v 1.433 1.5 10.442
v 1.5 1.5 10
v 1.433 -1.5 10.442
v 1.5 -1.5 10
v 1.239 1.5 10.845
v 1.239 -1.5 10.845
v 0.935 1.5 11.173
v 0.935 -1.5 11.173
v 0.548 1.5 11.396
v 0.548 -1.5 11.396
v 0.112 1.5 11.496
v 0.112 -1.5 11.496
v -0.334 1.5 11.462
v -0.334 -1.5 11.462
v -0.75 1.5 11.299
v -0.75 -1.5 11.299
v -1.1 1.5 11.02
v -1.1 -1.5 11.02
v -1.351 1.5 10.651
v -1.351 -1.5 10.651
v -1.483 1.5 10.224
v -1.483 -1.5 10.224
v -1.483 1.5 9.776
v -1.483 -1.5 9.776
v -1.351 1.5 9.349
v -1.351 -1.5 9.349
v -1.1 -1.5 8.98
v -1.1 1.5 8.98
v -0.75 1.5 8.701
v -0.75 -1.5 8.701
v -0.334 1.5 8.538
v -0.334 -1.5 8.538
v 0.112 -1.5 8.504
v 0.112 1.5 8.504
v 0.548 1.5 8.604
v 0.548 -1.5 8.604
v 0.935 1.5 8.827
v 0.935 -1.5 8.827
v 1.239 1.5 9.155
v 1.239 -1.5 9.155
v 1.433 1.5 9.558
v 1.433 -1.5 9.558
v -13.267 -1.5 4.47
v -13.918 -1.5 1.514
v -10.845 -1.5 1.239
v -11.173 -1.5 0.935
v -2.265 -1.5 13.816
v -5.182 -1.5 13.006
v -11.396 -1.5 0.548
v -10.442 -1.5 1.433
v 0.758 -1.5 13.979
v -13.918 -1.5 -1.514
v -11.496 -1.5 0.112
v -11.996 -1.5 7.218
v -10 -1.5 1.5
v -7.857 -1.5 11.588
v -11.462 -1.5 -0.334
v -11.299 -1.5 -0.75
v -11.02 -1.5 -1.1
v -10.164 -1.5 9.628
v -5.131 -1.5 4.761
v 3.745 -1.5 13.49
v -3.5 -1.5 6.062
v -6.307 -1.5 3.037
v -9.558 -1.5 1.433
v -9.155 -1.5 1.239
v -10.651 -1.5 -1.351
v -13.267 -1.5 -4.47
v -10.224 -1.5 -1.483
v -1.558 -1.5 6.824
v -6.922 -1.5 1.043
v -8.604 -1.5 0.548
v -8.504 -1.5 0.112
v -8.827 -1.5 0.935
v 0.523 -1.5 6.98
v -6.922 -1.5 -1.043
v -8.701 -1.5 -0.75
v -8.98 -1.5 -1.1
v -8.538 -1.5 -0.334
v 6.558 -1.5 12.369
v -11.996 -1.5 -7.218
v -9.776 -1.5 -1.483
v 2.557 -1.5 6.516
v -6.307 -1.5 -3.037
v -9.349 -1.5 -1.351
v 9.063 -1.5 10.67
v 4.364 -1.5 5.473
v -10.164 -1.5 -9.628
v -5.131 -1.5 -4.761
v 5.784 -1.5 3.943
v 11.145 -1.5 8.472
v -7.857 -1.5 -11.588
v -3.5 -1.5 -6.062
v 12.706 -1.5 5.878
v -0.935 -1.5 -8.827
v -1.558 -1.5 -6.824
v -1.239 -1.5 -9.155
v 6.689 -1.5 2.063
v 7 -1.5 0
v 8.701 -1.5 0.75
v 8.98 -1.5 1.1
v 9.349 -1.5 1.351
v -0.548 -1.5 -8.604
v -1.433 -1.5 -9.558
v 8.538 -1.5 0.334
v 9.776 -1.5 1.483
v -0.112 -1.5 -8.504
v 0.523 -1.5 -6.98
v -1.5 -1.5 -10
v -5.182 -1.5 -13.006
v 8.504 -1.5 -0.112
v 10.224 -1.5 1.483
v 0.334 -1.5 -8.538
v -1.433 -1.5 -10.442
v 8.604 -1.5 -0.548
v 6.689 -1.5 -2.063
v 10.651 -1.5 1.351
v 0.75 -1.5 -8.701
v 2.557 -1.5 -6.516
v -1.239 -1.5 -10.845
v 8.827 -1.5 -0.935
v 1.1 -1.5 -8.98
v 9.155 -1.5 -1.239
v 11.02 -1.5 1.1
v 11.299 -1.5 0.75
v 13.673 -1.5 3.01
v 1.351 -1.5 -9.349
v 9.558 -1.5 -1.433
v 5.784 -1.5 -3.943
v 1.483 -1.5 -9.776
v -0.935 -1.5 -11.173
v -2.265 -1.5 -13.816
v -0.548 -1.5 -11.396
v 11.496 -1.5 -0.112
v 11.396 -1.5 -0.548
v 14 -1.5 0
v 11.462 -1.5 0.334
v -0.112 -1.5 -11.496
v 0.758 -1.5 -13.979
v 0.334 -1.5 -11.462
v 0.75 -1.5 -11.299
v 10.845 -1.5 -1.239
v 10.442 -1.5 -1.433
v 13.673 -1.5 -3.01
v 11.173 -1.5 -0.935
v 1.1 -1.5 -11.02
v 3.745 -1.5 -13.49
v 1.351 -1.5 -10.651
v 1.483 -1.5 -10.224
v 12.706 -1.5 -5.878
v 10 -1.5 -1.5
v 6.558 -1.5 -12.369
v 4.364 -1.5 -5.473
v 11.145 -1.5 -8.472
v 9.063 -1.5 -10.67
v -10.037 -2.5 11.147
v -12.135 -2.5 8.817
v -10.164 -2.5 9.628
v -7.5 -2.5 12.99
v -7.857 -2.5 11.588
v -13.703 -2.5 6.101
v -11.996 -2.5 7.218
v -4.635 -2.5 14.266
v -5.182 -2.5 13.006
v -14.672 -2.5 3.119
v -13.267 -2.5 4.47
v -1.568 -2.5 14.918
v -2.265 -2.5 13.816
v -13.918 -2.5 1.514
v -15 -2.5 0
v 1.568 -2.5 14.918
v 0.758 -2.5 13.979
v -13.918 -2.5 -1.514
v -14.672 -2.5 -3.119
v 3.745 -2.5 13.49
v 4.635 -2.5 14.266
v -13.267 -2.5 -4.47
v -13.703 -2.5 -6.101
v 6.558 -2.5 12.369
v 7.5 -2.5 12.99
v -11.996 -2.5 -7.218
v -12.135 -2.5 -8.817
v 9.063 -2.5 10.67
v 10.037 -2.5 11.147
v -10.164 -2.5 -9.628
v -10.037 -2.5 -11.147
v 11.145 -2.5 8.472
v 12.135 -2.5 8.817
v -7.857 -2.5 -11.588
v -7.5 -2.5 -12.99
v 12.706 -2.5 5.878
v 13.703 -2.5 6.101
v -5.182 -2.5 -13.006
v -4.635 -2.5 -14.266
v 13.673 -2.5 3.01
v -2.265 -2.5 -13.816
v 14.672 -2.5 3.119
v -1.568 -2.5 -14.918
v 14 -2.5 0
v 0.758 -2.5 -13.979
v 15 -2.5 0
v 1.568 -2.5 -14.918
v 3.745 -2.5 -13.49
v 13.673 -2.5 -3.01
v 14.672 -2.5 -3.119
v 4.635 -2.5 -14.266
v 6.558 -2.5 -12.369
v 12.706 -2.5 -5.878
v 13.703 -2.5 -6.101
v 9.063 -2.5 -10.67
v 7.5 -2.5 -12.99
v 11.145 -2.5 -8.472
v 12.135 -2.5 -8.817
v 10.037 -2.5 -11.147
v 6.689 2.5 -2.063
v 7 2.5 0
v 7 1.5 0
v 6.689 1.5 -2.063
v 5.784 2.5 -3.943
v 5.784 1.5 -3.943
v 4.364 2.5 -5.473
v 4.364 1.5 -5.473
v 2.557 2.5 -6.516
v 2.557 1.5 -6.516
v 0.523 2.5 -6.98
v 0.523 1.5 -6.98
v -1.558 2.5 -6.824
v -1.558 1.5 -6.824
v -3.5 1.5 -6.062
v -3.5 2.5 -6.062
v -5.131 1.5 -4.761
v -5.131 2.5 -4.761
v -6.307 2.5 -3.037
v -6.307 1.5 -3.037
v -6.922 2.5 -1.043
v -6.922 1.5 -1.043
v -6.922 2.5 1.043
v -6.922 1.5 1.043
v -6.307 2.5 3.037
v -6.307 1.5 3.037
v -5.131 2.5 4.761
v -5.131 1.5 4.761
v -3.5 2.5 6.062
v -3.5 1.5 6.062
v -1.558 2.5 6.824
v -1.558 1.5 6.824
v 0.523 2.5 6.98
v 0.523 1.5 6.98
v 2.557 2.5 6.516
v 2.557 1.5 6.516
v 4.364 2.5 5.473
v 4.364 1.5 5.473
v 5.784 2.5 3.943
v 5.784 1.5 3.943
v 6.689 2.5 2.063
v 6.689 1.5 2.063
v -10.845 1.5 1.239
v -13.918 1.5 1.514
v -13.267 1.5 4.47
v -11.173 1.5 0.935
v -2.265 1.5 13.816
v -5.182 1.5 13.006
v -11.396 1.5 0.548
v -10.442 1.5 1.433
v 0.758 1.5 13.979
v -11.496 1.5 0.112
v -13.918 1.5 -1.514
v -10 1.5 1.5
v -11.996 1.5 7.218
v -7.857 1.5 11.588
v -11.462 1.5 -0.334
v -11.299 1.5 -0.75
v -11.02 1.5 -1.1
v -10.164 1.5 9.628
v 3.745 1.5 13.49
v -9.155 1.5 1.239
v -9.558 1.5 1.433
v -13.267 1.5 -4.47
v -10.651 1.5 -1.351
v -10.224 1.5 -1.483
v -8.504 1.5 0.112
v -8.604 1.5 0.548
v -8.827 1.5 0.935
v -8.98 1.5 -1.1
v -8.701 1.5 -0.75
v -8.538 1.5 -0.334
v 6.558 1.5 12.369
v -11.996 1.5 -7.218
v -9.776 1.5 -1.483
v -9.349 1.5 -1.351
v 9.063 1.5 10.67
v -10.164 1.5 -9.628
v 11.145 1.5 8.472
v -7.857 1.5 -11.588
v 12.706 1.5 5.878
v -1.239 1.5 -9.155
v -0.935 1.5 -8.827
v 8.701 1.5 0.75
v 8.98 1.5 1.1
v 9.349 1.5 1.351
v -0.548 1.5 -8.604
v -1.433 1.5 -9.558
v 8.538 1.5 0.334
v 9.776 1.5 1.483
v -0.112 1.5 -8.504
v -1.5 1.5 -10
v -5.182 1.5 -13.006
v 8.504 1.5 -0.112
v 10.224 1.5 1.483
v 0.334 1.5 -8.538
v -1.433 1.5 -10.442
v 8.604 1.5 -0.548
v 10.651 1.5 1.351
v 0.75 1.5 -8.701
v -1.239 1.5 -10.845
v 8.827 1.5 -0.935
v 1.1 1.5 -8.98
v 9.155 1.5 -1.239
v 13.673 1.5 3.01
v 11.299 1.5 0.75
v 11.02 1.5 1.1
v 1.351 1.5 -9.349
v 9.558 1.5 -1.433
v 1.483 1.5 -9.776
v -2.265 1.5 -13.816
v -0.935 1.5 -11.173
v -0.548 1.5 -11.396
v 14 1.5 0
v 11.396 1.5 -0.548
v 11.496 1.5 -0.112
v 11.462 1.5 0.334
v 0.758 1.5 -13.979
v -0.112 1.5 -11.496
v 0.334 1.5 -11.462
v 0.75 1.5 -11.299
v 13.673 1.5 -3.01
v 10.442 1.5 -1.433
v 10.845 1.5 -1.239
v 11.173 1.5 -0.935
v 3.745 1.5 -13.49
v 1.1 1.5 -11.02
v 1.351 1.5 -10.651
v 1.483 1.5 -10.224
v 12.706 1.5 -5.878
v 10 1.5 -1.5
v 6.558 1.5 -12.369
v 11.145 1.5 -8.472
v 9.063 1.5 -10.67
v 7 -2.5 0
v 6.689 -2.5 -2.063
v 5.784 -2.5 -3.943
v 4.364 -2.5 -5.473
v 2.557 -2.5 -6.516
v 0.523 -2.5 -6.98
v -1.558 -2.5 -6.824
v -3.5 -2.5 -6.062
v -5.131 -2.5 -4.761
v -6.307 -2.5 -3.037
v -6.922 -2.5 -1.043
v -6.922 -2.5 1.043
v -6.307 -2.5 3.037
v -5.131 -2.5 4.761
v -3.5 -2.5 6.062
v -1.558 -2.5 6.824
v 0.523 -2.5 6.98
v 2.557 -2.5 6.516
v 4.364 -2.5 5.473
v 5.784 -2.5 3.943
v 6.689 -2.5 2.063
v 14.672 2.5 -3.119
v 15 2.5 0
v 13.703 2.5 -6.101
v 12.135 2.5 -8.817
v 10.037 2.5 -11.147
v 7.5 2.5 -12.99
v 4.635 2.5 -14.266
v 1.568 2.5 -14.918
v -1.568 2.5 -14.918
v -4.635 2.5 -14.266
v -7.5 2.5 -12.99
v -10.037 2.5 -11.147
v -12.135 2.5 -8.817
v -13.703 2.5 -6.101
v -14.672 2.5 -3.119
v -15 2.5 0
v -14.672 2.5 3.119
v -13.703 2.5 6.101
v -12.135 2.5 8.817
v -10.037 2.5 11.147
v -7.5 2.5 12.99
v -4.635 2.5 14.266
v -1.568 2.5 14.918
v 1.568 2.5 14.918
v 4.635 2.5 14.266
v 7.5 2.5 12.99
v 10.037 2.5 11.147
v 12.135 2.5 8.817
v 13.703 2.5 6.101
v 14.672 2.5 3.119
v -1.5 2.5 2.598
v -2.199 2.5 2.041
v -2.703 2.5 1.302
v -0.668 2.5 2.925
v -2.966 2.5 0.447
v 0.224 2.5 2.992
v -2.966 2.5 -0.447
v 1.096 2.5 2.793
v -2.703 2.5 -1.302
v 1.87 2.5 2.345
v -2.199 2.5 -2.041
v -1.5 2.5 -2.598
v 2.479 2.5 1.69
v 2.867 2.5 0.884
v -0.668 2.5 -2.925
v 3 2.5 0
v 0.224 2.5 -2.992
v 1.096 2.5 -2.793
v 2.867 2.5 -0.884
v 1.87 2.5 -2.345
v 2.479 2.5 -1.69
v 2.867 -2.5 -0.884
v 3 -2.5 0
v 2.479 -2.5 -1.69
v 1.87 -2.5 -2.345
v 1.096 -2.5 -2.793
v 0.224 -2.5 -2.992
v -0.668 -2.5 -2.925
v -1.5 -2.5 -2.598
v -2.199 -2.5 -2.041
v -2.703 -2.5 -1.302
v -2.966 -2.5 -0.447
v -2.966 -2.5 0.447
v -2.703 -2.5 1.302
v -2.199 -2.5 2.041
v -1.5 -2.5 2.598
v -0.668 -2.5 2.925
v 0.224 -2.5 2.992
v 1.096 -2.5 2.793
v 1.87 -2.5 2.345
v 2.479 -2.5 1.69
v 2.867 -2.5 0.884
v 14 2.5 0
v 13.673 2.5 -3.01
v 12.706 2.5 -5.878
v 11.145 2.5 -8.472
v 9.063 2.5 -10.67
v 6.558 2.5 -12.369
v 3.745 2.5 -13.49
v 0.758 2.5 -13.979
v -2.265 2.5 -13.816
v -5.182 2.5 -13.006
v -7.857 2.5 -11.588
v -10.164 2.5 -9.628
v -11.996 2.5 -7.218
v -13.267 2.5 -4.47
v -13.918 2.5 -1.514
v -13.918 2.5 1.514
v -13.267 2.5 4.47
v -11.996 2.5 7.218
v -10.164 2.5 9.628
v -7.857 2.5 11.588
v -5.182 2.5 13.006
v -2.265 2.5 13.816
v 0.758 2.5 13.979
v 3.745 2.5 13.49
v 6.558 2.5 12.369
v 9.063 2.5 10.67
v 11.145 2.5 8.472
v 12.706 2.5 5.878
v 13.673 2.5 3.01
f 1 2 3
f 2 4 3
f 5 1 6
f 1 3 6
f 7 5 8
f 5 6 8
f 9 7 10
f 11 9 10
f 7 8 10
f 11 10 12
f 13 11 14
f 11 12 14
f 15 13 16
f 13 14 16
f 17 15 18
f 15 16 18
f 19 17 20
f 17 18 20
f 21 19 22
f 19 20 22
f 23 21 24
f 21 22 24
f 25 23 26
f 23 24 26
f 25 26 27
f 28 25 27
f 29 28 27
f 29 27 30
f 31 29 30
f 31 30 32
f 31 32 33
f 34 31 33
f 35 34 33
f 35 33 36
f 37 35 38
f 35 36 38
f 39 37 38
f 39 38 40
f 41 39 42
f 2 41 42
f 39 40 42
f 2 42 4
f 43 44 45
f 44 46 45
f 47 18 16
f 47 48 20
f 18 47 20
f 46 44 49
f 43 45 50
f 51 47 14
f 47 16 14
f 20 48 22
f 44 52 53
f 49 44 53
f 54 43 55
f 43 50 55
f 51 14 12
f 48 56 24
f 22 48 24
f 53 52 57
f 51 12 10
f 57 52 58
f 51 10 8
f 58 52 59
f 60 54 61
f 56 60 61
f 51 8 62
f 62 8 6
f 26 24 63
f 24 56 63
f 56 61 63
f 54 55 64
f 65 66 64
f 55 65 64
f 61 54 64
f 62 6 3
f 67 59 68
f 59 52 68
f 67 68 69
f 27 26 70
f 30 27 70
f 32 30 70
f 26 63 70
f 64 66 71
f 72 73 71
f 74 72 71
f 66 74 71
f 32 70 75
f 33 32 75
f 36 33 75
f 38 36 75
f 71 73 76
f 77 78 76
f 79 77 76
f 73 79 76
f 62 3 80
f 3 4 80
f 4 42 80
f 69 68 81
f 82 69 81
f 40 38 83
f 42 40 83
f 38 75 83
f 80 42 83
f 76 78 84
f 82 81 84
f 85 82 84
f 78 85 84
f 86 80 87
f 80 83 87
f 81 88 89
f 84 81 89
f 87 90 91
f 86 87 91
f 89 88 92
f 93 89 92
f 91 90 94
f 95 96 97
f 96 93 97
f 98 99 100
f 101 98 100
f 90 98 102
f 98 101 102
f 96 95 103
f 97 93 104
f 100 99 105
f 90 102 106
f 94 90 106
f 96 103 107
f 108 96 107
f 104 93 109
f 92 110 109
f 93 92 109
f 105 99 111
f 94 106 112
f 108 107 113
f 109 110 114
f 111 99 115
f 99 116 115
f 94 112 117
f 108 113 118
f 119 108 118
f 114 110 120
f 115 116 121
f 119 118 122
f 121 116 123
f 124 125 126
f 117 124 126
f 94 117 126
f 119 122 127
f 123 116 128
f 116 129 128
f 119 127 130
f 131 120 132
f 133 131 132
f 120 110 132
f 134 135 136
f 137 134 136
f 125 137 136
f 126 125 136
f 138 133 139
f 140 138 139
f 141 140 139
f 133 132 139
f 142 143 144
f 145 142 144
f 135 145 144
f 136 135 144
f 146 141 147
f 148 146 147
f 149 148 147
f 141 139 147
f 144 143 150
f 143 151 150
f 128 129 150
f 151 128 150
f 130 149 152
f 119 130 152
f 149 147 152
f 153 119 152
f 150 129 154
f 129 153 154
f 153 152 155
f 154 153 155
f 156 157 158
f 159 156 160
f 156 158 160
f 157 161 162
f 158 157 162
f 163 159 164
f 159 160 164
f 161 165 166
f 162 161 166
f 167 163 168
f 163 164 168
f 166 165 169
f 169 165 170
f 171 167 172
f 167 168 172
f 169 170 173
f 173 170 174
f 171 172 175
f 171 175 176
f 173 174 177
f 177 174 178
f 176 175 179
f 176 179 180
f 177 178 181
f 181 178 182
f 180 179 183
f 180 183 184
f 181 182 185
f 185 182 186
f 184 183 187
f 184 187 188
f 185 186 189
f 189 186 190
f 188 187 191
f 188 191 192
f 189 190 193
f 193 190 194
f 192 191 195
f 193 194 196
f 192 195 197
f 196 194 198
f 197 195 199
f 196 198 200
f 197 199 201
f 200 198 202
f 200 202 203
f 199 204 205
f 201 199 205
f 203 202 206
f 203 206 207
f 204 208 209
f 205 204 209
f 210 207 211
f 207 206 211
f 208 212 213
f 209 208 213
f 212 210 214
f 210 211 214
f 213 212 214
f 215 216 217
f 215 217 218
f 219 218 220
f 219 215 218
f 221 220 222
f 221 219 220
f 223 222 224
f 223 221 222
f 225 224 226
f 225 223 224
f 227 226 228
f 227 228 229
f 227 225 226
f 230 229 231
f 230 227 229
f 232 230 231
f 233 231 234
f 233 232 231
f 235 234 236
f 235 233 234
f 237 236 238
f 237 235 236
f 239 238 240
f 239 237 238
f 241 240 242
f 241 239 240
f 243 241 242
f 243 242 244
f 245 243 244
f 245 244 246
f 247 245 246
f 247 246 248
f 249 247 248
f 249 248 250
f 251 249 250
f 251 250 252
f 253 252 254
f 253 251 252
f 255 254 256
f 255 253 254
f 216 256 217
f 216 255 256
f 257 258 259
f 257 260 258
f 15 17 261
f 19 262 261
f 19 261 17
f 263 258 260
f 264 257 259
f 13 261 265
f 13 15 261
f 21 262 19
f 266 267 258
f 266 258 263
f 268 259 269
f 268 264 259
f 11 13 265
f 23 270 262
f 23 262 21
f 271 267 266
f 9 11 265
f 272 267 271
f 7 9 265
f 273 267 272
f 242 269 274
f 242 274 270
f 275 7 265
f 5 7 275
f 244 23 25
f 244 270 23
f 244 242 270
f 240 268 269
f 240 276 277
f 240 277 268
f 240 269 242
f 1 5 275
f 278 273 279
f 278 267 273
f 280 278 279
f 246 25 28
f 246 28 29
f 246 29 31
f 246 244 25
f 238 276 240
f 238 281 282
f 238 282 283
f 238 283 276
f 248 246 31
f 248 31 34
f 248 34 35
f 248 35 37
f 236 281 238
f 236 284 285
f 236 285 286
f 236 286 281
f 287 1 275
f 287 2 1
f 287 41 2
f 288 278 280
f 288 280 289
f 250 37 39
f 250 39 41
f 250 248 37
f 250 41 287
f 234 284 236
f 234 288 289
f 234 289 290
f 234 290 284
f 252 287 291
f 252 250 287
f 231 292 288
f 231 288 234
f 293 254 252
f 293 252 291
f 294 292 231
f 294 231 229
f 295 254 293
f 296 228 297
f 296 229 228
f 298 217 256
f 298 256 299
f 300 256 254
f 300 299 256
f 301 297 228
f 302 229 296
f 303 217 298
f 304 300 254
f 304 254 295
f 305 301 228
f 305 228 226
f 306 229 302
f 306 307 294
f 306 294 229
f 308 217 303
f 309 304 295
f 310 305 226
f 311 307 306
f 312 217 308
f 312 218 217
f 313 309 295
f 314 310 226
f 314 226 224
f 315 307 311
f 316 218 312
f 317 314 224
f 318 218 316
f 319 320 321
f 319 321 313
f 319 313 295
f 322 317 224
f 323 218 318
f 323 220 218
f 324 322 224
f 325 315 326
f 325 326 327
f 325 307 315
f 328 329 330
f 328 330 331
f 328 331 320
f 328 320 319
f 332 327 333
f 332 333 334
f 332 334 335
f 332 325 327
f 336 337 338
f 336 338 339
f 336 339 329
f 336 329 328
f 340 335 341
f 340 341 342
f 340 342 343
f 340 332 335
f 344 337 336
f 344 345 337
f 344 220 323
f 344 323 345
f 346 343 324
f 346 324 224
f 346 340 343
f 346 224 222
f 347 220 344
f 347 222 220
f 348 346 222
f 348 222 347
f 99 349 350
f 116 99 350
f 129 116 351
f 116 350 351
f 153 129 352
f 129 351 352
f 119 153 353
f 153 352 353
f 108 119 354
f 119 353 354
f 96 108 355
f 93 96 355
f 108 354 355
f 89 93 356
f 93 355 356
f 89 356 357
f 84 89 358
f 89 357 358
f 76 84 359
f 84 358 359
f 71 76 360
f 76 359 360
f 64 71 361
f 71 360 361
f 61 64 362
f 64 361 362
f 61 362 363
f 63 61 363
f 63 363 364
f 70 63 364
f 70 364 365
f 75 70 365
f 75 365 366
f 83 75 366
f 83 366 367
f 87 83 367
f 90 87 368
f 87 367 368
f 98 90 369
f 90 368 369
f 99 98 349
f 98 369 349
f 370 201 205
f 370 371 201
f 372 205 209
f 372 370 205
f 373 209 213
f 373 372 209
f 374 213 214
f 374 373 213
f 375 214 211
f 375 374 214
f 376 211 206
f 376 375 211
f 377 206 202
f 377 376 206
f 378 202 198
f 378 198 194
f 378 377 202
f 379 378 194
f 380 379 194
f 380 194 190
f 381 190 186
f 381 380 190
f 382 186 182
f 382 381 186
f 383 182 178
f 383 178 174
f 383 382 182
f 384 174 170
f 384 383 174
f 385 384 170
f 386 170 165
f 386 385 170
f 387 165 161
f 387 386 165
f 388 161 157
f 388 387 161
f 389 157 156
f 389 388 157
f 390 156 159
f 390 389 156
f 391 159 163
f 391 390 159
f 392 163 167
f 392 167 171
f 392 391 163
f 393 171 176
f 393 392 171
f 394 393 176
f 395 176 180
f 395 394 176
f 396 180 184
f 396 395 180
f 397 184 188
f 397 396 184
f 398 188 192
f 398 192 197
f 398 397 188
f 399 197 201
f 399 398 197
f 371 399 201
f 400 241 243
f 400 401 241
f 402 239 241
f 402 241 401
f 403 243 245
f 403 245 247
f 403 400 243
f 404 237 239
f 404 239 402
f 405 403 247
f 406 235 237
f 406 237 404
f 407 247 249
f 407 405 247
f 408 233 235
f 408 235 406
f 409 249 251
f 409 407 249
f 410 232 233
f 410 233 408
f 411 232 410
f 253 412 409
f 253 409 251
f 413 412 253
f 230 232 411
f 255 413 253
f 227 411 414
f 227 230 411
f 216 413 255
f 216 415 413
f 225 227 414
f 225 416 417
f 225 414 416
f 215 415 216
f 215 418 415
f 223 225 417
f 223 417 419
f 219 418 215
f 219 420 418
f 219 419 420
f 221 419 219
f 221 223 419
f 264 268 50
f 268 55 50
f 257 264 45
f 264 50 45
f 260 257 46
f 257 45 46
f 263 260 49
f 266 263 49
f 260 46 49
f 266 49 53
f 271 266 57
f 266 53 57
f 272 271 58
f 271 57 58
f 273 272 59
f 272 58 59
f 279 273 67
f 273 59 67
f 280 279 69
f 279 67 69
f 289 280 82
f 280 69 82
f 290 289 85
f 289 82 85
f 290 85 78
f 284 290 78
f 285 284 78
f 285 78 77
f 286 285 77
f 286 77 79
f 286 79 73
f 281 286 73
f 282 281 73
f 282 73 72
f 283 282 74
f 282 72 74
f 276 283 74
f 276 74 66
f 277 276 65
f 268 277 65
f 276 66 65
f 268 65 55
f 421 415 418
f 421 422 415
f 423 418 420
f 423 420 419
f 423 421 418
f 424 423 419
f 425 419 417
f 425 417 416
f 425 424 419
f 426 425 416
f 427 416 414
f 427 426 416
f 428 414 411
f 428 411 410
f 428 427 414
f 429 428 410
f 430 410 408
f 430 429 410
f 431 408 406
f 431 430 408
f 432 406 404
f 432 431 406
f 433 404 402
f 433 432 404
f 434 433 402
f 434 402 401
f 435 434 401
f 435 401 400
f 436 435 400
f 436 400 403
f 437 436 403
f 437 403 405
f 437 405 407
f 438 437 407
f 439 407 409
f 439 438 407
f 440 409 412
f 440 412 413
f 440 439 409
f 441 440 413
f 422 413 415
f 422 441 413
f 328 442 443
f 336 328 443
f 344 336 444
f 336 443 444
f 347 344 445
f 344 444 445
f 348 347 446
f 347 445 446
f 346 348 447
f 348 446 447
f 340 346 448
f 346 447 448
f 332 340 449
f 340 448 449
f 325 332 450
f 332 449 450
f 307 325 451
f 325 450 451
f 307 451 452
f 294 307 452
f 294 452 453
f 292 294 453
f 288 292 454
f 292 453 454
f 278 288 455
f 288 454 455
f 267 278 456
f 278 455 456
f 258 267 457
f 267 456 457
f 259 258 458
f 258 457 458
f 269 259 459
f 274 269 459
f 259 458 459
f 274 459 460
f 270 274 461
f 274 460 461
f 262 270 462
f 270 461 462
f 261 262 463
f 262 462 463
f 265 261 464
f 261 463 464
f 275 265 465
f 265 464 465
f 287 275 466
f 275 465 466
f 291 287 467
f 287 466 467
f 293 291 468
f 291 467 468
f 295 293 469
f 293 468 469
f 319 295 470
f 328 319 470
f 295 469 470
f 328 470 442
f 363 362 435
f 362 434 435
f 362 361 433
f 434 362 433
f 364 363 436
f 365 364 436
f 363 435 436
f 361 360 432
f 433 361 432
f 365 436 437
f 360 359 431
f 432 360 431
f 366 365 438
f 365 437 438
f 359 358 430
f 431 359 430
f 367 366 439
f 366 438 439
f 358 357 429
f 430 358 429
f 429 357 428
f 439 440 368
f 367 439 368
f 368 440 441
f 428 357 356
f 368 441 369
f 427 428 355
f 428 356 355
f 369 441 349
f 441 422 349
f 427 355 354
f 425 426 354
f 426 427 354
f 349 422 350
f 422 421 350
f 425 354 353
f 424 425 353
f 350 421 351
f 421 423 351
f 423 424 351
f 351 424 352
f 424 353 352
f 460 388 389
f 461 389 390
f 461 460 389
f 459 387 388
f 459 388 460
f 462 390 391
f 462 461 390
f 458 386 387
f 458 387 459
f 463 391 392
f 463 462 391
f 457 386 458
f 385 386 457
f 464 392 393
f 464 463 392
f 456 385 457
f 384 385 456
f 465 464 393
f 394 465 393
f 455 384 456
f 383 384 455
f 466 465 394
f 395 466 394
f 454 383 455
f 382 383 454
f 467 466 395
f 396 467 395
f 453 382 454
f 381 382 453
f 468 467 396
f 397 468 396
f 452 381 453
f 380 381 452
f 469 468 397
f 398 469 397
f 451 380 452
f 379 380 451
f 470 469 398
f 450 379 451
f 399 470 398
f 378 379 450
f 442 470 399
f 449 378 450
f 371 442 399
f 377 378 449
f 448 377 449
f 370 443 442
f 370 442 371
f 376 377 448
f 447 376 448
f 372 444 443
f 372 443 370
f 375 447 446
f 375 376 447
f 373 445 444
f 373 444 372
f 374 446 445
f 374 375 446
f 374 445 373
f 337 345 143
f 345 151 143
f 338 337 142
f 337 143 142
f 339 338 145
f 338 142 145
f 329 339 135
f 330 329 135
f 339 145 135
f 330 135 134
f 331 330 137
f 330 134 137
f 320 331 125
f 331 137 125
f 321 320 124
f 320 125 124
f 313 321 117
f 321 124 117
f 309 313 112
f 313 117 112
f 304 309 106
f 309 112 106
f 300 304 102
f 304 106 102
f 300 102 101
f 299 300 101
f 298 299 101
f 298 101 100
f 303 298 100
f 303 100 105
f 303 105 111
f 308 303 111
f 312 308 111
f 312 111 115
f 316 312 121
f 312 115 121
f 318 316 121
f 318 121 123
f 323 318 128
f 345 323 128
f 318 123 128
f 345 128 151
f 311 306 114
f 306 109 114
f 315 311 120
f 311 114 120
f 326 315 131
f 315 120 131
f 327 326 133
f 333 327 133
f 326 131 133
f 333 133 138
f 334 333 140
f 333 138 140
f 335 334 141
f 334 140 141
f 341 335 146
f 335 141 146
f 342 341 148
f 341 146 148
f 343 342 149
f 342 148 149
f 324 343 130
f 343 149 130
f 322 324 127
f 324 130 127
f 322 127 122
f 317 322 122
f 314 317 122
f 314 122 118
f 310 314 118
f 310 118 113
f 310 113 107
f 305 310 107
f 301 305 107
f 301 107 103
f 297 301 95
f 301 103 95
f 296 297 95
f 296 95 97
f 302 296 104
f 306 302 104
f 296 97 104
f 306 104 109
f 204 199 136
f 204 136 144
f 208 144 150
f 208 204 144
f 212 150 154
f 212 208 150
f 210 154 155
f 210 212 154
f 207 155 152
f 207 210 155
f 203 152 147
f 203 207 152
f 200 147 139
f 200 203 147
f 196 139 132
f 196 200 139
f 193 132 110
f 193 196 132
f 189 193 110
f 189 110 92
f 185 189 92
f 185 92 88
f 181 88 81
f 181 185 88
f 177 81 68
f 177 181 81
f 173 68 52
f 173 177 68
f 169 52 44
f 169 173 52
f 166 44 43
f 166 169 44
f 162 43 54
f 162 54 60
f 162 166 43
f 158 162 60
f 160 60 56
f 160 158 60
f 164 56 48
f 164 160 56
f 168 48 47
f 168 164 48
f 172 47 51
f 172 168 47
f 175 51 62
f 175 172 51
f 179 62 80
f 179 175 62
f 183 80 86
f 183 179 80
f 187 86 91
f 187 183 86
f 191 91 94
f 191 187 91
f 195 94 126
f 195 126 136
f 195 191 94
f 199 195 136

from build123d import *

# Parameters (mm, degrees)
SKETCH1_R                 = 15
SKETCH1_R_2               = 3
BOSS_EXTRUDE1_DEPTH       = 2.5
F_3_0MM_DOWEL_HOLE1_D     = 3
F_3_0MM_DOWEL_HOLE1_DEPTH = 5.001
CIRPATTERN1_COUNT         = 4
SKETCH6_R                 = 14
SKETCH6_R_2               = 7
CUT_EXTRUDE1_DEPTH        = 1


with BuildPart() as part:
    # Sketch1 → Boss-Extrude1 (new body, symmetric)
    with BuildSketch(Plane(origin=(0, 0, 0), x_dir=(1, 0, 0), z_dir=(0, 1, 0))):
        Circle(SKETCH1_R)
        Circle(SKETCH1_R_2, mode=Mode.SUBTRACT)
    extrude(amount=BOSS_EXTRUDE1_DEPTH, both=True)

    # Ø3.0mm Dowel Hole1
    with Locations(Plane(origin=(0, 2.5, 0), x_dir=(1, 0, 0), z_dir=(0, 1, 0))):
        with Locations((0, 10)):
            f_3_0mm_dowel_hole1 = Hole(F_3_0MM_DOWEL_HOLE1_D / 2, depth=F_3_0MM_DOWEL_HOLE1_DEPTH)

    # CirPattern1: Ø3.0mm Dowel Hole1 ×4 about axis
    cirpattern1_axis = Axis((0, 0, 0), (0, 1, 0))
    for i in range(1, CIRPATTERN1_COUNT):
        add(f_3_0mm_dowel_hole1.rotate(cirpattern1_axis, i * 360 / CIRPATTERN1_COUNT), mode=Mode.SUBTRACT)

    # Sketch6 → Cut-Extrude1 (cut)
    with BuildSketch(Plane(origin=(0, 2.5, 0), x_dir=(1, 0, 0), z_dir=(0, 1, 0))):
        Circle(SKETCH6_R)
        Circle(SKETCH6_R_2, mode=Mode.SUBTRACT)
    cut_extrude1 = extrude(amount=-CUT_EXTRUDE1_DEPTH, mode=Mode.SUBTRACT)

    # Mirror1: Cut-Extrude1 across plane
    add(cut_extrude1.mirror(Plane.ZX), mode=Mode.SUBTRACT)


solid = part.part
